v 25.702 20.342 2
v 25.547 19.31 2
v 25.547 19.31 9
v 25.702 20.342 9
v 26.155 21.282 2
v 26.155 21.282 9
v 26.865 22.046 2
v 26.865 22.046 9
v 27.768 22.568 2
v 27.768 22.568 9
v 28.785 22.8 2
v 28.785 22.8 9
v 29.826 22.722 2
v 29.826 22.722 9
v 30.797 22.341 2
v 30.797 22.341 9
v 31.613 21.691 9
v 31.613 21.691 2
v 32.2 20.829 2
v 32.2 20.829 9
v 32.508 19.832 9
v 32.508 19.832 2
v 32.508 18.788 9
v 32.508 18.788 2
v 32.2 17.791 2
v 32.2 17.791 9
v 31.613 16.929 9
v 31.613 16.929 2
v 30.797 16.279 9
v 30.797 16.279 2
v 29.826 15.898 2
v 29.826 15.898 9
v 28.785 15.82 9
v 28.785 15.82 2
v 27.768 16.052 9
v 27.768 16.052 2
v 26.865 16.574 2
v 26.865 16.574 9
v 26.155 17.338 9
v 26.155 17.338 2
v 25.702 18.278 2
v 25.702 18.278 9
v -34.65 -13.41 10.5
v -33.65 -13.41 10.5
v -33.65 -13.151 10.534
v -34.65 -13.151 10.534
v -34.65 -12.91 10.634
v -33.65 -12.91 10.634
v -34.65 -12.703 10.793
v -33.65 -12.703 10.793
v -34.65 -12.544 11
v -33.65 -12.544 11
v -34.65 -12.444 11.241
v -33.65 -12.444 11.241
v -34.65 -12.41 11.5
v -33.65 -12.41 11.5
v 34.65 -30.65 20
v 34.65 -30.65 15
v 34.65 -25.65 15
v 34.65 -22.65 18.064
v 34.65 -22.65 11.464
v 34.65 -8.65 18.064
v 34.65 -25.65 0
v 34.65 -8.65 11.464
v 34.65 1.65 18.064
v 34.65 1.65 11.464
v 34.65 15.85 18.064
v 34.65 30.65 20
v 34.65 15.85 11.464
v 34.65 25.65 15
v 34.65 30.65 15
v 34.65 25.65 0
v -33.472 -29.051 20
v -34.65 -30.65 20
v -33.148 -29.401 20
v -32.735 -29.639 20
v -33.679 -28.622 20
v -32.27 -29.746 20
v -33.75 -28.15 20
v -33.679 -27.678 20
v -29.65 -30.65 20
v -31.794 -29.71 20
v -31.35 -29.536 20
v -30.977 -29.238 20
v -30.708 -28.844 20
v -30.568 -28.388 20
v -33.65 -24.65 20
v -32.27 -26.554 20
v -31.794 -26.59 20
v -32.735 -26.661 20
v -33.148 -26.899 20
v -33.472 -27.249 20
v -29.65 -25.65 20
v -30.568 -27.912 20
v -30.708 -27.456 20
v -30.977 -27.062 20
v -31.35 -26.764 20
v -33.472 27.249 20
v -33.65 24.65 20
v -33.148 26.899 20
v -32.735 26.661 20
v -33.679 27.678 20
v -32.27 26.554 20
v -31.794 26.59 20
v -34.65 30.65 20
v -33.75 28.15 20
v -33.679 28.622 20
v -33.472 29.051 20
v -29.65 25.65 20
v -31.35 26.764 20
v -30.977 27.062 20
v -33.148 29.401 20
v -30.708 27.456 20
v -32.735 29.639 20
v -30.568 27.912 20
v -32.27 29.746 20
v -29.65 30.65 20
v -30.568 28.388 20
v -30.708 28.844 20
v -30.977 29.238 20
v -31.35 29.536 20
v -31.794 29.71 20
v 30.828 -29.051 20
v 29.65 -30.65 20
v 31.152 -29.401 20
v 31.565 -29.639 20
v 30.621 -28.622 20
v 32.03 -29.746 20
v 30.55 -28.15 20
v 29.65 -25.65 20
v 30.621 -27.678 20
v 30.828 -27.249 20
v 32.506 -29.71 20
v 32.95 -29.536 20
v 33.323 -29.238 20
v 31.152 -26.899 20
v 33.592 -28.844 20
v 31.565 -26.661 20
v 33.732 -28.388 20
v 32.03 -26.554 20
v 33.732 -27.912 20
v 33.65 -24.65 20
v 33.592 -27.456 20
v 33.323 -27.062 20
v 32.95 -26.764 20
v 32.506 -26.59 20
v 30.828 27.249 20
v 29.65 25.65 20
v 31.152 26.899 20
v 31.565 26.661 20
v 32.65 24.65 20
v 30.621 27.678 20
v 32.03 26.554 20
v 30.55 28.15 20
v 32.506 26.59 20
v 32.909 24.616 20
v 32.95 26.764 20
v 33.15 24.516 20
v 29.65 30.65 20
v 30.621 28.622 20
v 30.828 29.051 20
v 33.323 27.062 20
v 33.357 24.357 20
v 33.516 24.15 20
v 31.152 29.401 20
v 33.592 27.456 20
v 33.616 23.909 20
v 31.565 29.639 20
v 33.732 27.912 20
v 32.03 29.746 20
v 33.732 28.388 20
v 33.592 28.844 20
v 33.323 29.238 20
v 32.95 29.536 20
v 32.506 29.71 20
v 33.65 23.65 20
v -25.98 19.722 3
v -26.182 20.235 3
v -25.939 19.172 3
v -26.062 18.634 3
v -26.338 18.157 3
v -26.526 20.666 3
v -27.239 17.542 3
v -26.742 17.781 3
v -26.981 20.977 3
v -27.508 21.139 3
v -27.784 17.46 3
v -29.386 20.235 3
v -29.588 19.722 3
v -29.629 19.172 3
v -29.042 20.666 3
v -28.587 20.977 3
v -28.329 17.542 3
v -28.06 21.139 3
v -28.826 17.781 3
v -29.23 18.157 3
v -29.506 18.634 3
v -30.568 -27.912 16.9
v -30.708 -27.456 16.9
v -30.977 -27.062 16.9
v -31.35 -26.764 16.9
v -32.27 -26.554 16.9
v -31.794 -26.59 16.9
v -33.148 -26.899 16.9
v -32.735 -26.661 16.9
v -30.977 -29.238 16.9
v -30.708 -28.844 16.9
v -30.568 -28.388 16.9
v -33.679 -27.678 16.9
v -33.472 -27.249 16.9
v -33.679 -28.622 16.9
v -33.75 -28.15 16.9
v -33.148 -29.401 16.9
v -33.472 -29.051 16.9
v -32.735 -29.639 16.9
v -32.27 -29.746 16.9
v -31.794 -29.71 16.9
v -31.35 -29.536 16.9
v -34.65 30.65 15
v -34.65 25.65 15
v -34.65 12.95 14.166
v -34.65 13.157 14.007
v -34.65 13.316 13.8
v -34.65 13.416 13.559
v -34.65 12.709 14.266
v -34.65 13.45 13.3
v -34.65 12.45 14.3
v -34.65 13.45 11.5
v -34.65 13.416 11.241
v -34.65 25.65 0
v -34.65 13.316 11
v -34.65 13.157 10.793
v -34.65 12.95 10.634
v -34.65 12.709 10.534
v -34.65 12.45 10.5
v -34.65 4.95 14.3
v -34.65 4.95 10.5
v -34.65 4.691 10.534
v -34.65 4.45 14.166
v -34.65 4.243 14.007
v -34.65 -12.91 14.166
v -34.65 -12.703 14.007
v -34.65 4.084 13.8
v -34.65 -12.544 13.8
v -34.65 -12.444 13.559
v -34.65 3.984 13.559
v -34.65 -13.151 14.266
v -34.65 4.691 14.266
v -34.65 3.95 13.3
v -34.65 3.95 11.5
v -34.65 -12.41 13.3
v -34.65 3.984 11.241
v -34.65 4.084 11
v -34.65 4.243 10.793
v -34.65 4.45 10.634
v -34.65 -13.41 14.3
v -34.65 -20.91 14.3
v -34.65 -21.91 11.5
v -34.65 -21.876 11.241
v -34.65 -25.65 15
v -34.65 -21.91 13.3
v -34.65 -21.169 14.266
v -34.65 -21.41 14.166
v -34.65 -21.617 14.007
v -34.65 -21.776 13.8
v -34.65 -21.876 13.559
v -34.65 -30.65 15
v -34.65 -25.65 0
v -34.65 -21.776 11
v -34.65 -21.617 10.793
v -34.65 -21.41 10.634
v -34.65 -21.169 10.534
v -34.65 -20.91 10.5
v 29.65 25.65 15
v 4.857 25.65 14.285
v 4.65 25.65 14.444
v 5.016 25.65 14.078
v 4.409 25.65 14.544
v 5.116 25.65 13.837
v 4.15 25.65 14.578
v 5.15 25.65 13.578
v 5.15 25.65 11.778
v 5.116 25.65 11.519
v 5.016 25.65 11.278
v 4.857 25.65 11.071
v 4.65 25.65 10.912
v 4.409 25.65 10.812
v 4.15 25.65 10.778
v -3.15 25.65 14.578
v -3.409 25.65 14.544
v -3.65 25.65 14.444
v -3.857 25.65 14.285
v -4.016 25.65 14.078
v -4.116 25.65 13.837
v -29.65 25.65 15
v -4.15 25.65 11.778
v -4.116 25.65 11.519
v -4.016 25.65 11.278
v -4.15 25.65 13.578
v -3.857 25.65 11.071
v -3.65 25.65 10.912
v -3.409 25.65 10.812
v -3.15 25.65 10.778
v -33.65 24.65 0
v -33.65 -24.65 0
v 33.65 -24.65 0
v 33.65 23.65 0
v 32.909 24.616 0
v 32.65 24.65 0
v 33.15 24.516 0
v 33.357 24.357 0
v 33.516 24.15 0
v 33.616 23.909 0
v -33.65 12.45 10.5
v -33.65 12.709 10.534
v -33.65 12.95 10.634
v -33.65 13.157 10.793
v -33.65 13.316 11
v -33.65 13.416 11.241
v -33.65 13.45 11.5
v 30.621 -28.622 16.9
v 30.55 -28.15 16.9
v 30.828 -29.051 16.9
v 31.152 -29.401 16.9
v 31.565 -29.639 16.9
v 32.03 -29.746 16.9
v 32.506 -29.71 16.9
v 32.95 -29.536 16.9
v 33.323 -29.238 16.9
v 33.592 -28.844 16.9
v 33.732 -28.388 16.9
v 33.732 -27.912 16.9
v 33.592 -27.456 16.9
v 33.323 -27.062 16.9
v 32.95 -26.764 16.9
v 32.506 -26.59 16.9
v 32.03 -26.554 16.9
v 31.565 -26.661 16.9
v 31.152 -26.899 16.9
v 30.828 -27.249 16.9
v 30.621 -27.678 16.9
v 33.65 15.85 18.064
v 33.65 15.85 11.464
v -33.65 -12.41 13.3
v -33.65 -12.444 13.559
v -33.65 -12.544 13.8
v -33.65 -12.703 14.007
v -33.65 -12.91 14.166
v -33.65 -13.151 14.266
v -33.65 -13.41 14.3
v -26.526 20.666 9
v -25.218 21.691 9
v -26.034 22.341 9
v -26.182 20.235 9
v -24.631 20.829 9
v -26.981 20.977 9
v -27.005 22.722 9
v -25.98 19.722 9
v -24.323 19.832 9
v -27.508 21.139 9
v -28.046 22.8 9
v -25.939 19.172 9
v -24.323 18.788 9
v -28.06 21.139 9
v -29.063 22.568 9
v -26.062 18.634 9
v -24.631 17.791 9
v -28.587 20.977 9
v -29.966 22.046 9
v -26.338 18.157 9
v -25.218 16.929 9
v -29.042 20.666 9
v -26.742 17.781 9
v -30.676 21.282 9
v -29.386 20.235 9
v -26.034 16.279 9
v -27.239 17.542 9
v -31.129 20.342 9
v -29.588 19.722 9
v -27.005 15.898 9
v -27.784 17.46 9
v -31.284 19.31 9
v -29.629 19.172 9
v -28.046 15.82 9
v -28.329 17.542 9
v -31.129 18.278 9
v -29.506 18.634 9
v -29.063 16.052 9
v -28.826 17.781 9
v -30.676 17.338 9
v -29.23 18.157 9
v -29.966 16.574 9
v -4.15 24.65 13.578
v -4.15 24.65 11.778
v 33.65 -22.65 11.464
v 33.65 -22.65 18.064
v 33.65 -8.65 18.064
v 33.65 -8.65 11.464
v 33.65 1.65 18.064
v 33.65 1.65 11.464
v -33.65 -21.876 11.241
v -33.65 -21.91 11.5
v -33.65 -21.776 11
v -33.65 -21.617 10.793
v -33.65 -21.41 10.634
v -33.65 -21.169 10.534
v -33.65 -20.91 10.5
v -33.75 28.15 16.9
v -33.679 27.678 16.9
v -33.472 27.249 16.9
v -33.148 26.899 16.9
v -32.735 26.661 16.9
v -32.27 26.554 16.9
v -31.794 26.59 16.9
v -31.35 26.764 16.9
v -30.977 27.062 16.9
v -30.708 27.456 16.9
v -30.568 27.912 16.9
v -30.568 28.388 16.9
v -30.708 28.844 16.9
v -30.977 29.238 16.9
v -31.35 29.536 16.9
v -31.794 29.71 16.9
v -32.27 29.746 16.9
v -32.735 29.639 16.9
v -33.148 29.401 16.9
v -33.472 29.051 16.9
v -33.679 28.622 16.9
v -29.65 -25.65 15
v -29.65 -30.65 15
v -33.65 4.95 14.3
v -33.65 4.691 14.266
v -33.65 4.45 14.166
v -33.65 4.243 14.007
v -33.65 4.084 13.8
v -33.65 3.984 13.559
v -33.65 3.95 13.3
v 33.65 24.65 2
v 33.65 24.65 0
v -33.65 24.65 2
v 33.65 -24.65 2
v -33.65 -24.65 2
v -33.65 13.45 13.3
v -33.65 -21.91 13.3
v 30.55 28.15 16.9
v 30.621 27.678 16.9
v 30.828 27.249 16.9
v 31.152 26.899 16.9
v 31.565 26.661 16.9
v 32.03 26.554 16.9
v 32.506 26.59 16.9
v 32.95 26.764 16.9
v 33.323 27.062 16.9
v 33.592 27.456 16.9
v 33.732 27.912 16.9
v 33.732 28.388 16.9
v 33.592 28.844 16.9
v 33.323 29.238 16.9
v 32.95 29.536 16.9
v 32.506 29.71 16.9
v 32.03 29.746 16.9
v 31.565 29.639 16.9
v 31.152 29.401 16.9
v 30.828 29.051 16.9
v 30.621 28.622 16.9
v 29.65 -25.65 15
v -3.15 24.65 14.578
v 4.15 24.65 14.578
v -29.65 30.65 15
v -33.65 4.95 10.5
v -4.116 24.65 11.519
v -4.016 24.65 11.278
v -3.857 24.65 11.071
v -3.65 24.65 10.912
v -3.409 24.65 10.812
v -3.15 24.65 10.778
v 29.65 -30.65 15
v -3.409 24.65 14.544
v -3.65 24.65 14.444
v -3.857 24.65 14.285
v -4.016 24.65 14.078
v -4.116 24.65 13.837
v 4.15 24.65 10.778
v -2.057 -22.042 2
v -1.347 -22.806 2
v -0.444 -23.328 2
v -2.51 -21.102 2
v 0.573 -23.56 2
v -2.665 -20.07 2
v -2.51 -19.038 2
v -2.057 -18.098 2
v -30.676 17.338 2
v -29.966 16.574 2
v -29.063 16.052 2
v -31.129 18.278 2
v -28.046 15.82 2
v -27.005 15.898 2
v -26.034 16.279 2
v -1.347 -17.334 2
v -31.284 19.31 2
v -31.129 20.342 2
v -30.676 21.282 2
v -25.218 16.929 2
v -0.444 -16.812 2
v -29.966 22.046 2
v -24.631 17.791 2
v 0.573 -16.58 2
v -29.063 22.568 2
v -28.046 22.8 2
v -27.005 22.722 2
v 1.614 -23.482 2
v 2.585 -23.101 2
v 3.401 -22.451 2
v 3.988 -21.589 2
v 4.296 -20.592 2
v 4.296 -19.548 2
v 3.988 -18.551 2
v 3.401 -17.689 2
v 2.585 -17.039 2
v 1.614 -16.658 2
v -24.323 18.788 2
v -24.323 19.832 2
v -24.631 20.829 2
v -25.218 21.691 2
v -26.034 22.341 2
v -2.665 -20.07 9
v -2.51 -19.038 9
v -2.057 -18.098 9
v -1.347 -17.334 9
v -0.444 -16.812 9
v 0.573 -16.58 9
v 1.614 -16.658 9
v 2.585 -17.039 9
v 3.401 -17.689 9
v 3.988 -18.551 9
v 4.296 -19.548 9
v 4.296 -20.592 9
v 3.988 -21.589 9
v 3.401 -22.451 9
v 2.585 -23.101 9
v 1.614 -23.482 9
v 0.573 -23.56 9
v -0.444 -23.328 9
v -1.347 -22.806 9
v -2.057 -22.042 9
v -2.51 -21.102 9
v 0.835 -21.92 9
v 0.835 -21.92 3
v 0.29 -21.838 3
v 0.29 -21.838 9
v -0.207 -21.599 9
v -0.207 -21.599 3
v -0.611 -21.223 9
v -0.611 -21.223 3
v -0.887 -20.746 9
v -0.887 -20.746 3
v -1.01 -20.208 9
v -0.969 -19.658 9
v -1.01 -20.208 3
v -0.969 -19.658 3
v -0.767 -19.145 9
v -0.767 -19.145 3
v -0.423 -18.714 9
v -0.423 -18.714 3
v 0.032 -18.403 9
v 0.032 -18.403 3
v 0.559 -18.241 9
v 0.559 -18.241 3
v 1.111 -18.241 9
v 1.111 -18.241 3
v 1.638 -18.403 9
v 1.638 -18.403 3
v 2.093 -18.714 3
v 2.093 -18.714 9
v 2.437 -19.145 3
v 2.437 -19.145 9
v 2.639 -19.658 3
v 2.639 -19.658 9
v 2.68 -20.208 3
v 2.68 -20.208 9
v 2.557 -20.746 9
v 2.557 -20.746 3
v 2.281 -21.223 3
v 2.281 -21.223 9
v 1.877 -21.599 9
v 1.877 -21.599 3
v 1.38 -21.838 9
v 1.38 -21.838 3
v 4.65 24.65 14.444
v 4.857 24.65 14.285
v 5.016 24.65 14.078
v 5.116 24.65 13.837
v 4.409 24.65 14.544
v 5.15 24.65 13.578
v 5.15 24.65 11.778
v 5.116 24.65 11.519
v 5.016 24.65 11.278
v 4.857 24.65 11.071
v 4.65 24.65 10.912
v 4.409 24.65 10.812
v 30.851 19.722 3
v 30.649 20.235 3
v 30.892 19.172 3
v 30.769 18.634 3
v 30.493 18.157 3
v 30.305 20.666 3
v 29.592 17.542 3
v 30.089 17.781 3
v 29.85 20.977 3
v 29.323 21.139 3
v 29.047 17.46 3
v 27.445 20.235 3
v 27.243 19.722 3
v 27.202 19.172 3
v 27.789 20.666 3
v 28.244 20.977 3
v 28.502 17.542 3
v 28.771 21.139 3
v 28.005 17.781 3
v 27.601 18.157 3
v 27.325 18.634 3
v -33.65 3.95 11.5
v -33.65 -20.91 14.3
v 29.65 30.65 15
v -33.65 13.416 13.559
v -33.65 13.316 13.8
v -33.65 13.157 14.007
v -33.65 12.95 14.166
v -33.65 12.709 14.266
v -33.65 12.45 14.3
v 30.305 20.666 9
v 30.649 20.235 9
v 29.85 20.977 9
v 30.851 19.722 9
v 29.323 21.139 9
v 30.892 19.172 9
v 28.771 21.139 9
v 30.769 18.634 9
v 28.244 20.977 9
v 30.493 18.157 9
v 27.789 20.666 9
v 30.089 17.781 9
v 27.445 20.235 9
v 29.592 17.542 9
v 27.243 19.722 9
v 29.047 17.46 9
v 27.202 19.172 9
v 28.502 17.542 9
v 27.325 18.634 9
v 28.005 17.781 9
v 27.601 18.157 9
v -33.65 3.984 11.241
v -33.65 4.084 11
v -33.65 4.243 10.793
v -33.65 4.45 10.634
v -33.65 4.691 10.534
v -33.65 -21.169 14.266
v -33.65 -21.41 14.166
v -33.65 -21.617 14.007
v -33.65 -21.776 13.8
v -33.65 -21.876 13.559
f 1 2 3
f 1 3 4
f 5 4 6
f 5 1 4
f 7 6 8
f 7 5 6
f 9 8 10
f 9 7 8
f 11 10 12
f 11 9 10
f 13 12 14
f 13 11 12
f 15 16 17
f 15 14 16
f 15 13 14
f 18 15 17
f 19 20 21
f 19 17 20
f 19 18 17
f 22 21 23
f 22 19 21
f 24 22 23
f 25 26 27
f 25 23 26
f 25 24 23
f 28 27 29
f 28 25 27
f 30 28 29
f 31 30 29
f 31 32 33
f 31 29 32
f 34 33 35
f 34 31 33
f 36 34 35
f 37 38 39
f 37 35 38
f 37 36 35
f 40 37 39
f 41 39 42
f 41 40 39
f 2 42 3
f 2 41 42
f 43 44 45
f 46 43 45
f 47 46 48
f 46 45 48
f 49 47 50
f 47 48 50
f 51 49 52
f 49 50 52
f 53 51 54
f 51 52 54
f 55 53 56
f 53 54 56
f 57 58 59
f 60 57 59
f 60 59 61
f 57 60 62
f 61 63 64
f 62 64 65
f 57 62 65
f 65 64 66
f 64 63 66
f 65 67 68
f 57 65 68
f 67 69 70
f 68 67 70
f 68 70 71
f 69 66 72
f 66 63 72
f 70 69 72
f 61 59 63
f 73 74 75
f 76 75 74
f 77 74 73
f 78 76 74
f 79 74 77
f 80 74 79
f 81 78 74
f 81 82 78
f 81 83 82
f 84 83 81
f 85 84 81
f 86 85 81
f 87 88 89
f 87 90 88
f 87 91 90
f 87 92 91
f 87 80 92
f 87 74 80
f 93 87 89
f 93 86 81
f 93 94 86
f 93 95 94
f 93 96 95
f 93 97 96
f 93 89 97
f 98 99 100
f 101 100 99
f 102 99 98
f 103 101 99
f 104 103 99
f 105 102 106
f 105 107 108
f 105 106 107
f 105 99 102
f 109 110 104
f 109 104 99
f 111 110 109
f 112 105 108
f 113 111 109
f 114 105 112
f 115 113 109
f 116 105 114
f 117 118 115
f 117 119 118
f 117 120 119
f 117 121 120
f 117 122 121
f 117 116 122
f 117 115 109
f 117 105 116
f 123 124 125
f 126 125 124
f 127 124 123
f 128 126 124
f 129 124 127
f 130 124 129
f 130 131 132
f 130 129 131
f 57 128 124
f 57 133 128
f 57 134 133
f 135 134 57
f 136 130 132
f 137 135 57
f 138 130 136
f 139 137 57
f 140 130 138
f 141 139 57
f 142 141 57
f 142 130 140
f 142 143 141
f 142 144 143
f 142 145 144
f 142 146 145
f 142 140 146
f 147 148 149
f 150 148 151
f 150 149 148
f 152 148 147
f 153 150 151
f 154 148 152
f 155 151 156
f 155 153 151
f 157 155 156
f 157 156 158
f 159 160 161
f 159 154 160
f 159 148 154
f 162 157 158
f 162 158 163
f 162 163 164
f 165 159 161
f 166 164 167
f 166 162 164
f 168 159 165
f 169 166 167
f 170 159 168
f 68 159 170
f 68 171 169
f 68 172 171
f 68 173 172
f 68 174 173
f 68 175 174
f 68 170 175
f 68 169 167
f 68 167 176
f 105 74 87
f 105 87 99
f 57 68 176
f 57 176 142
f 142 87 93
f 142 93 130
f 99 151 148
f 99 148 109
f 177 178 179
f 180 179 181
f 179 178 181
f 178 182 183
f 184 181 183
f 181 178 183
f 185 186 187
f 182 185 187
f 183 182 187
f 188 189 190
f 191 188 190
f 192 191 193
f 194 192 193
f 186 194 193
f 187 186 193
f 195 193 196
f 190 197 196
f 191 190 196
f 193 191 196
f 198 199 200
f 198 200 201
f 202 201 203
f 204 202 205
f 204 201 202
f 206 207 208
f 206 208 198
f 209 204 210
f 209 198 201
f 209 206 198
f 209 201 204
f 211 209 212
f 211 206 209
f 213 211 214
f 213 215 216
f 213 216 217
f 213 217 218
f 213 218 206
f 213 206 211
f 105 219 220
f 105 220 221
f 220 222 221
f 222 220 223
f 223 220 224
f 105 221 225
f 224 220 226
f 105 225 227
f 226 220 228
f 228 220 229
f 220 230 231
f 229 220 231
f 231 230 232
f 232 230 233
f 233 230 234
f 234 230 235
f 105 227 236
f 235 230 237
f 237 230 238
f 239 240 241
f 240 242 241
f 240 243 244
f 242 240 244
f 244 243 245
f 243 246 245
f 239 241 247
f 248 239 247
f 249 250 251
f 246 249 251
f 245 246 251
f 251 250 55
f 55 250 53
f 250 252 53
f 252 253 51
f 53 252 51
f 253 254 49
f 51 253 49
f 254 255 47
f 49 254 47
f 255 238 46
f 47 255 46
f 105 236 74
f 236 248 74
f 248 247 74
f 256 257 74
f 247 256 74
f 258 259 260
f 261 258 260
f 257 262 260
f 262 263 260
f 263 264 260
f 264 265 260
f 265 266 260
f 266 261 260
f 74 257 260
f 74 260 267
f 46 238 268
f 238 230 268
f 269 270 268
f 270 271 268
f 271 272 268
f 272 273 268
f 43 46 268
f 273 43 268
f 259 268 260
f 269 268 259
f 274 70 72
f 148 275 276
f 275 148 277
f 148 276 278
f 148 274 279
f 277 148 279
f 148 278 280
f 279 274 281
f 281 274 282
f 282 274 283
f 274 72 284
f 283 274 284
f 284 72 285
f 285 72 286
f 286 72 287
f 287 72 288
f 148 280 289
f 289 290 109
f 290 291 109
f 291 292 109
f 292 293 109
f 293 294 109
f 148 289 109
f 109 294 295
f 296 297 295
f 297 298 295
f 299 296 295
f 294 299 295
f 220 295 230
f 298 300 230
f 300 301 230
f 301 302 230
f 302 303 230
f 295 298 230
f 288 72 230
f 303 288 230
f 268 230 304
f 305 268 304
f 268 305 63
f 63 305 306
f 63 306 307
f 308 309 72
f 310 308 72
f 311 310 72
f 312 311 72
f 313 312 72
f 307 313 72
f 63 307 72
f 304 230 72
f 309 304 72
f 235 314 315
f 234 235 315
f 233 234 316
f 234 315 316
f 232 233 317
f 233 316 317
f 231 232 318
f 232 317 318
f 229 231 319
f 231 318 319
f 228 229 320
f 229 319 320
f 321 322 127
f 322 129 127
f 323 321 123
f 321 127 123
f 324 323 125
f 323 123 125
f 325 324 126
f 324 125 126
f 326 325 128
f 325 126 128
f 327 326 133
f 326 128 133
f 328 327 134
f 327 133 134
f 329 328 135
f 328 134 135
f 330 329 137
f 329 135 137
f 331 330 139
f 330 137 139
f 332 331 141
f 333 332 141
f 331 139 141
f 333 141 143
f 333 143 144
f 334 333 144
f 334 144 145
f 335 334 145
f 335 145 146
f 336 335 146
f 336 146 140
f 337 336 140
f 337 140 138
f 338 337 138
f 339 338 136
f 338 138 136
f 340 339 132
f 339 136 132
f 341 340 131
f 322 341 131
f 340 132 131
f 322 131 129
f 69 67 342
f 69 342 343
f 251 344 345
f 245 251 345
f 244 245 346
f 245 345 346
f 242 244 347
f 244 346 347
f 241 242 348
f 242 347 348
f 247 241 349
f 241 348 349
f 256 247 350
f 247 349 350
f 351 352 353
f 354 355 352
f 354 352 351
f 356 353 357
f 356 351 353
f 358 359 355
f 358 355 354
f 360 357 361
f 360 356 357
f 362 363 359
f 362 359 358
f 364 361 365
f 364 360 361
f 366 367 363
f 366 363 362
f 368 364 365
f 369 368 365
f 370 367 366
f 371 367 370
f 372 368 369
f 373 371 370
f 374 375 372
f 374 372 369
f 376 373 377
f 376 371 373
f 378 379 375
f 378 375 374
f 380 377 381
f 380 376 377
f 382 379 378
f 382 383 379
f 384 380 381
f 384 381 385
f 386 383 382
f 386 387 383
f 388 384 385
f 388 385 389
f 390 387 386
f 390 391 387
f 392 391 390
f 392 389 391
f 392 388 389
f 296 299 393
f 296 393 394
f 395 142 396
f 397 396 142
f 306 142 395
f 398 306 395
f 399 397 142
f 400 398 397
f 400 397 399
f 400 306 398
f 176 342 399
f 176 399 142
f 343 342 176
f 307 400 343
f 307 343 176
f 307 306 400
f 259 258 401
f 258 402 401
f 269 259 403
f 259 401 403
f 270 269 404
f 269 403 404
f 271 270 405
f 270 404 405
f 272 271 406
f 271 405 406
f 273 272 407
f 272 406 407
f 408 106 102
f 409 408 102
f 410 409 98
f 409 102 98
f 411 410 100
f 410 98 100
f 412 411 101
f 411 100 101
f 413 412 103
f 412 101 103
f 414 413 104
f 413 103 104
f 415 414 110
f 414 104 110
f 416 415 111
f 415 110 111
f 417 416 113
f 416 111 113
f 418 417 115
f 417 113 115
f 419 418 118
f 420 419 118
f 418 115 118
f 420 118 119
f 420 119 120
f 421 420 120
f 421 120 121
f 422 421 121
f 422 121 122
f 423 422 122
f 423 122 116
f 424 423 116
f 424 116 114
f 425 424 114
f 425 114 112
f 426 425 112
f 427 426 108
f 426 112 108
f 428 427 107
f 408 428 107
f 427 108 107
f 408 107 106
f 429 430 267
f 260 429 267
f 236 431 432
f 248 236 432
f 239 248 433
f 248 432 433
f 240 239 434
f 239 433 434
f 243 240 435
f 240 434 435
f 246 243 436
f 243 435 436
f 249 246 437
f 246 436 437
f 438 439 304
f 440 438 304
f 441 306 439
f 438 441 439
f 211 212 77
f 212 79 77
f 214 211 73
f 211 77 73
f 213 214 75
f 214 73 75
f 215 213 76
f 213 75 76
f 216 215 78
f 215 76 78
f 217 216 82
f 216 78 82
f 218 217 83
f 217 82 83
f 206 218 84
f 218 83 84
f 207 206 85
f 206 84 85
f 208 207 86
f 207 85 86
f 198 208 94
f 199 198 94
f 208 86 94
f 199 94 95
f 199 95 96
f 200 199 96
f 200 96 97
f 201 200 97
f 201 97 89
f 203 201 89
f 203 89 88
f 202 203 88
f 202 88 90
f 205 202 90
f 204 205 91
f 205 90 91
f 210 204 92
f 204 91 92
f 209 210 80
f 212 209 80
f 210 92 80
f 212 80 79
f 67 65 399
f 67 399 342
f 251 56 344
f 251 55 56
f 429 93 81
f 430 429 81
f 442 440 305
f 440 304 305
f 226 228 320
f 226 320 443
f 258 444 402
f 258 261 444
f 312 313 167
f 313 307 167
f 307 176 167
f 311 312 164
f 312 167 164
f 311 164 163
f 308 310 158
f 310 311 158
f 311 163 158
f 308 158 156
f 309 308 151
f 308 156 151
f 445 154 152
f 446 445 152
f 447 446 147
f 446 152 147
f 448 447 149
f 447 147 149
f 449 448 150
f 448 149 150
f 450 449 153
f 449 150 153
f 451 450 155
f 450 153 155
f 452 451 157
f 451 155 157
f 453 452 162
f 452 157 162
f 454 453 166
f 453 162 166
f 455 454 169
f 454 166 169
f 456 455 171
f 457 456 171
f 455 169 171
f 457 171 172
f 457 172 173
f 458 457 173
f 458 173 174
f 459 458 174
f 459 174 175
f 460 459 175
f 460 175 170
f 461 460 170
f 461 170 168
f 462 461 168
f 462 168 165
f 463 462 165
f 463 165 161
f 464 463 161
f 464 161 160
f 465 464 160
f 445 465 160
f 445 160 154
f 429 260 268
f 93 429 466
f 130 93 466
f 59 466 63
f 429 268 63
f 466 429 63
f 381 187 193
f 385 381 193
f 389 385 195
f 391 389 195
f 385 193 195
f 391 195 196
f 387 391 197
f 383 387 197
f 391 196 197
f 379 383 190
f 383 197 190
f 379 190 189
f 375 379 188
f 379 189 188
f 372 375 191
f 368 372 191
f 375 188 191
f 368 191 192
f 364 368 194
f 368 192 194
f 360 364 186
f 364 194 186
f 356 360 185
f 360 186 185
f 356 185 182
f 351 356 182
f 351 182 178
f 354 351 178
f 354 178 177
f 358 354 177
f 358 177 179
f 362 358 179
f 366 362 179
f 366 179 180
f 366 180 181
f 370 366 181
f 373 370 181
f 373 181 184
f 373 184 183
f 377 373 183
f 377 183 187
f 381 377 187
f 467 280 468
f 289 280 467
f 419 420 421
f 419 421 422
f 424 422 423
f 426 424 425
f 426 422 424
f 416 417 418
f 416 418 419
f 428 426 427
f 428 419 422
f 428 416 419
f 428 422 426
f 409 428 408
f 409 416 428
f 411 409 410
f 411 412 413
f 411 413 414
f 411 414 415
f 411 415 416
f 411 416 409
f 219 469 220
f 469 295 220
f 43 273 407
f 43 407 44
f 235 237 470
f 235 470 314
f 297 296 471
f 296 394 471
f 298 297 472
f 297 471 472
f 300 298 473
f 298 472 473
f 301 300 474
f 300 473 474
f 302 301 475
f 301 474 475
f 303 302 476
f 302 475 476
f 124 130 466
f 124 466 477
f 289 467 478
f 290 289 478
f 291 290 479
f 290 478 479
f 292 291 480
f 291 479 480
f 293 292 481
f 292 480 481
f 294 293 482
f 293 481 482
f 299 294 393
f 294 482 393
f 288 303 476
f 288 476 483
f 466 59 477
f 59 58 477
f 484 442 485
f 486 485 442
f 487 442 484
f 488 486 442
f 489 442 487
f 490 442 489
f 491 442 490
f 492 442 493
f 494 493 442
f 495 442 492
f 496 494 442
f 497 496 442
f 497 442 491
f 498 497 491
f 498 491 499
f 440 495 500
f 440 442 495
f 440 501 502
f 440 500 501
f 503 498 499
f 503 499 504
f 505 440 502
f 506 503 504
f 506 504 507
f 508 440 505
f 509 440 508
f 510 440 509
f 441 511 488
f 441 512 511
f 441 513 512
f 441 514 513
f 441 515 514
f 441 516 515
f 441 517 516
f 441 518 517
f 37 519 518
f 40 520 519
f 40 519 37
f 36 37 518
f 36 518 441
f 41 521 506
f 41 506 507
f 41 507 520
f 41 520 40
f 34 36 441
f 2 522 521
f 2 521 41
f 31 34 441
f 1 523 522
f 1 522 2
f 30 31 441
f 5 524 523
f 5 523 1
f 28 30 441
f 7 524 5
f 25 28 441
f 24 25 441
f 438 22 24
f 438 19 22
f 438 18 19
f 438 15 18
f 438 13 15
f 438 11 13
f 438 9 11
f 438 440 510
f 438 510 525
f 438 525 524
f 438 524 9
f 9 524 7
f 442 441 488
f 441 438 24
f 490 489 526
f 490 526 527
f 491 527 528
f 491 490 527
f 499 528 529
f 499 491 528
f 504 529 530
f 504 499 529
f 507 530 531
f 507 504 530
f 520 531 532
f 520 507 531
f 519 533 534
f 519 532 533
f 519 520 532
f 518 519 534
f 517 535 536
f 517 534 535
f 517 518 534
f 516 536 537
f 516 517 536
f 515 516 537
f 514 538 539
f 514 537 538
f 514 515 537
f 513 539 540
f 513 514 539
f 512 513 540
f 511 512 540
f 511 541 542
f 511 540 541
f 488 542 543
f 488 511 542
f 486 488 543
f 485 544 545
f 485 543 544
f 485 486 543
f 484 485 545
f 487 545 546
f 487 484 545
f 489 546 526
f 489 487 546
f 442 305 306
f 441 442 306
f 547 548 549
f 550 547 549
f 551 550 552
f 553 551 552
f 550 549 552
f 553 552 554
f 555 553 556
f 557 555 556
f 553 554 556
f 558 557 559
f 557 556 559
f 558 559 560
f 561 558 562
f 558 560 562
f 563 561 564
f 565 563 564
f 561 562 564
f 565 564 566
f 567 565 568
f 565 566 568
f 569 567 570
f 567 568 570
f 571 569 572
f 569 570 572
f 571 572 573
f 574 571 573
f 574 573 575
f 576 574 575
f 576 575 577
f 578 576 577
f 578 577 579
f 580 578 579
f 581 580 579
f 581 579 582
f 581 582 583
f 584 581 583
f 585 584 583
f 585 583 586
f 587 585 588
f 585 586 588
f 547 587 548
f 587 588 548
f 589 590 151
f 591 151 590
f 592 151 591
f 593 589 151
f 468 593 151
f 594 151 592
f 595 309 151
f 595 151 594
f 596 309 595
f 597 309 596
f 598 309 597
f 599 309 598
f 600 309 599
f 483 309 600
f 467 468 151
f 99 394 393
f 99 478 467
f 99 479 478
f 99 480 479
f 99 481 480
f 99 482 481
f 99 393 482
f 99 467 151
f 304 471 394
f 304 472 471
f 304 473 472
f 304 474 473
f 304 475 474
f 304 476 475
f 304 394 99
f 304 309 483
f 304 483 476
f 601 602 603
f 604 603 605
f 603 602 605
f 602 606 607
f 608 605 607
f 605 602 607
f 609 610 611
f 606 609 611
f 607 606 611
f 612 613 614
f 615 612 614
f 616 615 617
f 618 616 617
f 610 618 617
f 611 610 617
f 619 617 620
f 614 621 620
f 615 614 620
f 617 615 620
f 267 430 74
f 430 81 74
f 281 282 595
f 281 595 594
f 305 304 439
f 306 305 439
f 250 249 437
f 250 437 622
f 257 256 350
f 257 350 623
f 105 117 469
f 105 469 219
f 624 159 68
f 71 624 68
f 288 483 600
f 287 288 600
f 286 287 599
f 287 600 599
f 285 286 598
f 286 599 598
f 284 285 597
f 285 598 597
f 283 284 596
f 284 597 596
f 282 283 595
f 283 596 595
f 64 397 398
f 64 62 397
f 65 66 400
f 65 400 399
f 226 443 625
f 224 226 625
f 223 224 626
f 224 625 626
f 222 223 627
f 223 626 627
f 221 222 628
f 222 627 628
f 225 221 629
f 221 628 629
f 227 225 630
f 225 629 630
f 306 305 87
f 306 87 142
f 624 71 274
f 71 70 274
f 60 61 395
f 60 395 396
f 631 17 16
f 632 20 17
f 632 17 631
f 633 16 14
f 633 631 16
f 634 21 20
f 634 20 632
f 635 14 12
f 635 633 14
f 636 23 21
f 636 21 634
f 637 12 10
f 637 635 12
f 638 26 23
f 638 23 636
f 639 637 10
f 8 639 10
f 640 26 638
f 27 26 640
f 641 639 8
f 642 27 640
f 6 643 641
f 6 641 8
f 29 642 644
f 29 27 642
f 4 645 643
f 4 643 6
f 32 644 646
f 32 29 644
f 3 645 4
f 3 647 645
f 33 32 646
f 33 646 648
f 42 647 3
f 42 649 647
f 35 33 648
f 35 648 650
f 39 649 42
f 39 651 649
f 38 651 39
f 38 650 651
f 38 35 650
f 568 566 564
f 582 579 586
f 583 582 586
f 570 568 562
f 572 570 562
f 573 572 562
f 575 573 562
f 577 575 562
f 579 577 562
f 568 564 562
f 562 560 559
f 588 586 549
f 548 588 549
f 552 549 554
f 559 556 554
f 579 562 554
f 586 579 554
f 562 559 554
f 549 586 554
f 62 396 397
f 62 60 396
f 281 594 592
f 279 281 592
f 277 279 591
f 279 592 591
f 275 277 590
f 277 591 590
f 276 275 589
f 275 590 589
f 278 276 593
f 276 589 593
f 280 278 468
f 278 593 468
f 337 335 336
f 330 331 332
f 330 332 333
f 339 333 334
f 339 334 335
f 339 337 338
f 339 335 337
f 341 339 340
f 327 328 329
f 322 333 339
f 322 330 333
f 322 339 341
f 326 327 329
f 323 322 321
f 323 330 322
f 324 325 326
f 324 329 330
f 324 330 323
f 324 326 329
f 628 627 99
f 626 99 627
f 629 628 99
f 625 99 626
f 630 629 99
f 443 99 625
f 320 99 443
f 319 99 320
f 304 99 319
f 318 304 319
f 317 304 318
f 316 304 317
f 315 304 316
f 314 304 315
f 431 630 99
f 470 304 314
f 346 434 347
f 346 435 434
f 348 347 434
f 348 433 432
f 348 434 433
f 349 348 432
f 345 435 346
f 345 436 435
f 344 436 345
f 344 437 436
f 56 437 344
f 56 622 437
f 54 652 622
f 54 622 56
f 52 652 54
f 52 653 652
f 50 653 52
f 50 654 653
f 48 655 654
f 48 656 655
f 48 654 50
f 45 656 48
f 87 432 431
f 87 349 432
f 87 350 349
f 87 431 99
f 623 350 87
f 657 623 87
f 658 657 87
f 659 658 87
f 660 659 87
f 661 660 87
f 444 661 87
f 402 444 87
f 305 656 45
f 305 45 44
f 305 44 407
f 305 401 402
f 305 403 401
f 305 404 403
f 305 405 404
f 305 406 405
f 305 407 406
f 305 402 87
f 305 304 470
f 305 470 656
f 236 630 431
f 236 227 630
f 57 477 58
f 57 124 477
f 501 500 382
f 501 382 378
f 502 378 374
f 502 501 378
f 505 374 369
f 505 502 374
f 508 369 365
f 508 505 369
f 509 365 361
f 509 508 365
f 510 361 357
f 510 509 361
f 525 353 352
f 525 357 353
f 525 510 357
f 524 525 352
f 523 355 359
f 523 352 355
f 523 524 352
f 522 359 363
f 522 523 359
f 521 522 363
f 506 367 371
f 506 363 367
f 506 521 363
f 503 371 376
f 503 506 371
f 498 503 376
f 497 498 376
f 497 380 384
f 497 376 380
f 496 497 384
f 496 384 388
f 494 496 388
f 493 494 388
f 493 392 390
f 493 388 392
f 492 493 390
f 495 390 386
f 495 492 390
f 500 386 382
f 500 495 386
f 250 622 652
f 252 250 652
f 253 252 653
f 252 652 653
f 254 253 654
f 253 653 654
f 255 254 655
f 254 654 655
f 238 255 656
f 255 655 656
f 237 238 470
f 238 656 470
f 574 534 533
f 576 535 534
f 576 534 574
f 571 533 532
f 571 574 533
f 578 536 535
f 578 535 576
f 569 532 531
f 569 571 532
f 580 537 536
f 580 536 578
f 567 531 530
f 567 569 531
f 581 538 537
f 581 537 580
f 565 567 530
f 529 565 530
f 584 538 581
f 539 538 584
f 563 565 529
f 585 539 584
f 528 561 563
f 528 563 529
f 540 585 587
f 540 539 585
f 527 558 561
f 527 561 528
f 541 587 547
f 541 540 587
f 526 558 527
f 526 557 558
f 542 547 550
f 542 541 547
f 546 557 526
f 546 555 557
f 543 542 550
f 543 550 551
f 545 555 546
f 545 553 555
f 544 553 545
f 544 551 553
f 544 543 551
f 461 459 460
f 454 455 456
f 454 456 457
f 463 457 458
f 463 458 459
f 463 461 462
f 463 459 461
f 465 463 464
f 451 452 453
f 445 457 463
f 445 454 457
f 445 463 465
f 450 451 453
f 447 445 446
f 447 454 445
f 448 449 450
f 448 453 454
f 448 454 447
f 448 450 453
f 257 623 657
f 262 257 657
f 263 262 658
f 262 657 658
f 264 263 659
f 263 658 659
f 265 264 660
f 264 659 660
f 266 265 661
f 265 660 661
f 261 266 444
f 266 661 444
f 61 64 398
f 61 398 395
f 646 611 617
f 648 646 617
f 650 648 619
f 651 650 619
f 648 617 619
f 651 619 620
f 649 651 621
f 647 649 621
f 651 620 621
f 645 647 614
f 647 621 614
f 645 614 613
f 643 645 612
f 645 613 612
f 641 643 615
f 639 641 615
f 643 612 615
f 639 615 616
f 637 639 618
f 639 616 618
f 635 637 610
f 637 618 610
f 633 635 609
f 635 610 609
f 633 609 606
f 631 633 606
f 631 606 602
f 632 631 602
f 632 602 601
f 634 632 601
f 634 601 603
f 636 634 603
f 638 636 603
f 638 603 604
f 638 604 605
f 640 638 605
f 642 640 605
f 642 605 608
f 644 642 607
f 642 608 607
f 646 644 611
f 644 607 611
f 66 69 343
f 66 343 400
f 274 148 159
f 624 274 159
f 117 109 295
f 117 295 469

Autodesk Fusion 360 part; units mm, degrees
sketch "Sketch1" plane through (0, 0, 0) normal (0, 0, 1) x (1, 0, 0)
  line L0 (33.65, 24.65) -> (-33.65, 24.65)
  line L1 (-33.65, 24.65) -> (-33.65, -24.65)
  line L2 (-33.65, -24.65) -> (33.65, -24.65)
  line L3 (33.65, -24.65) -> (33.65, 24.65)
  line L4 (33.65, 24.65) -> (-33.65, -24.65) construction
  line L5 (-33.65, 24.65) -> (33.65, -24.65) construction
  line L6 (34.65, 25.65) -> (-34.65, 25.65)
  line L7 (-34.65, 25.65) -> (-34.65, -25.65)
  line L8 (-34.65, -25.65) -> (34.65, -25.65)
  line L9 (34.65, -25.65) -> (34.65, 25.65)
  line L10 (34.65, 25.65) -> (-34.65, -25.65) construction
  line L11 (-34.65, 25.65) -> (34.65, -25.65) construction
  line L12 (33.65, 24.65) -> (38.3726, 24.65)
  line L13 (38.3726, 24.65) -> (38.3726, 29.0356)
  line L14 (38.3726, 29.0356) -> (34.2811, 29.0356)
  line L15 (34.2811, 29.0356) -> (33.65, 24.65)
  line L16 (38.3726, 24.65) -> (34.2811, 29.0356) construction
  dimension "d1" = 67.3
  dimension "d2" = 49.3
  dimension "d3" = 69.3
  dimension "d4" = 51.3
extrude "Extrude1" add sketch "Sketch1" along normal blind 2 contours L0 L1 L2 L3 makes body 1
extrude "Extrude2" add sketch "Sketch1" along normal blind 20 separate body contours L6 L9 L12 L15 | L6 L7 L8 L9 L12 L15 makes body 2
sketch "Sketch2" plane through (0, 0, 2) normal (0, 0, 1) x (-1, 0, 0)
  line L0 (-33.65, 24.65) -> (-33.65, -24.65)
  line L1 (-33.65, -24.65) -> (33.65, -24.65)
  line L2 (33.65, -24.65) -> (33.65, 24.65)
  line L3 (33.65, 24.65) -> (-33.65, 24.65)
  circle A0 centre (27.784, -19.31) radius 3.5
  circle A1 centre (-29.047, -19.31) radius 3.5
  line L4 (33.65, -24.65) -> (33.65, 24.65) construction
  line L5 (-33.65, -24.65) -> (33.65, -24.65) construction
  circle A2 centre (-0.835, 20.07) radius 3.5
  dimension "d9" = 7
  dimension "d10" = 7
  dimension "d11" = 5.866
  dimension "d12" = 5.34
  dimension "d14" = 5.34
  dimension "d15" = 7
  dimension "d16" = 34.485
  dimension "d20" = 4.603
  dimension "d21" = 4.58
extrude "Extrude4" add sketch "Sketch2" along normal blind 7 contours A0 | A1 | A2 bodies 1
extrude "Extrude3" add sketch "Sketch2" along normal blind 3 contours A0 | A1 | A2 bodies 1
hole "Hole1" at (-27.784, 19.31, 9) direction (0, 0, -1) diameter 3.7 depth 6 tip angle 180 bodies 1
hole "Hole2" at (29.047, 19.31, 9) direction (0, 0, -1) diameter 3.7 depth 6 tip angle 180 bodies 1
hole "Hole3" at (0.835, -20.07, 9) direction (0, 0, -1) diameter 3.7 depth 6 tip angle 180 bodies 1
sketch "Sketch3" plane through (34.65, 0, 0) normal (1, 0, 0) x (0, 1, 0)
  line L0 (25.65, 0) -> (25.65, 20)
  line L1 (25.65, 20) -> (-25.65, 20)
  line L2 (-25.65, 20) -> (-25.65, 0)
  line L3 (-22.65, 18.064) -> (-8.65, 18.064)
  line L4 (-8.65, 18.064) -> (-8.65, 11.464)
  line L5 (-8.65, 11.464) -> (-22.65, 11.464)
  line L6 (-22.65, 11.464) -> (-22.65, 18.064)
  line L7 (1.65, 18.064) -> (15.85, 18.064)
  line L8 (15.85, 18.064) -> (15.85, 11.464)
  line L9 (15.85, 11.464) -> (1.65, 11.464)
  line L10 (1.65, 11.464) -> (1.65, 18.064)
  dimension "d33" = 14
  dimension "d34" = 6.6
  dimension "d35" = 14.2
  dimension "d36" = 6.6
  dimension "d37" = 3
  dimension "d38" = 9.8
  dimension "d39" = 1.936
  dimension "d40" = 1.936
extrude "Extrude5" cut sketch "Sketch3" against normal blind 2 bodies 2
sketch "Sketch4" plane through (0, 25.65, 0) normal (0, 1, 0) x (-1, 0, 0)
  line L0 (-34.65, 0) -> (34.65, 0)
  line L1 (34.65, 0) -> (34.65, 20)
  line L2 (34.65, 20) -> (-34.65, 20)
  line L3 (-34.65, 20) -> (-34.65, 0)
  line L4 (-5.15, 14.578) -> (4.15, 14.578)
  line L5 (4.15, 14.578) -> (4.15, 10.778)
  line L6 (4.15, 10.778) -> (-5.15, 10.778)
  line L7 (-5.15, 10.778) -> (-5.15, 14.578)
  dimension "d43" = 9.3
  dimension "d44" = 3.8
  dimension "d45" = 29.5
  dimension "d46" = 5.422
extrude "Extrude6" cut sketch "Sketch4" against normal blind 2 contours L4 L5 L6 L7 bodies 2
fillet "Fillet1" radius 1 4 edges at (-4.15, 25.15, 10.778) (-4.15, 25.15, 14.578) (5.15, 25.15, 14.578) (5.15, 25.15, 10.778) on bodies 2
sketch "Sketch5" plane through (-34.65, 0, 0) normal (-1, 0, 0) x (0, -1, 0)
  line L0 (-25.65, 0) -> (25.65, 0)
  line L1 (25.65, 0) -> (25.65, 20)
  line L2 (25.65, 20) -> (-25.65, 20)
  line L3 (-25.65, 20) -> (-25.65, 0)
  line L4 (-13.45, 14.3) -> (-3.95, 14.3)
  line L5 (-3.95, 14.3) -> (-3.95, 10.5)
  line L6 (-3.95, 10.5) -> (-13.45, 10.5)
  line L7 (-13.45, 10.5) -> (-13.45, 14.3)
  line L8 (12.41, 14.3) -> (21.91, 14.3)
  line L9 (21.91, 14.3) -> (21.91, 10.5)
  line L10 (21.91, 10.5) -> (12.41, 10.5)
  line L11 (12.41, 10.5) -> (12.41, 14.3)
  dimension "d51" = 9.5
  dimension "d52" = 3.8
  dimension "d53" = 9.5
  dimension "d54" = 3.8
  dimension "d55" = 12.2
  dimension "d56" = 3.74
  dimension "d57" = 5.7
  dimension "d58" = 5.7
extrude "Extrude7" cut sketch "Sketch5" against normal blind 2 contours L4 L5 L6 L7 bodies 2
extrude "Extrude8" cut sketch "Sketch5" against normal blind 2 contours L8 L9 L10 L11 bodies 2
fillet "Fillet2" radius 1 8 edges at (-34.15, 13.45, 14.3) (-34.15, 3.95, 14.3) (-34.15, 3.95, 10.5) (-34.15, 13.45, 10.5) (-34.15, -12.41, 10.5) (-34.15, -12.41, 14.3) (-34.15, -21.91, 14.3) (-34.15, -21.91, 10.5) on bodies 2
sketch "Sketch6" plane through (0, 25.65, 0) normal (0, 1, 0) x (-1, 0, 0)
  line L0 (4.15, 13.578) -> (4.15, 11.778)
  arc A0 (3.15, 10.778) -> (4.15, 11.778) centre (3.15, 11.778) ccw
  line L1 (3.15, 10.778) -> (-4.15, 10.778)
  arc A1 (-5.15, 11.778) -> (-4.15, 10.778) centre (-4.15, 11.778) ccw
  line L2 (-5.15, 11.778) -> (-5.15, 13.578)
  arc A2 (-4.15, 14.578) -> (-5.15, 13.578) centre (-4.15, 13.578) ccw
  line L3 (-4.15, 14.578) -> (3.15, 14.578)
  arc A3 (4.15, 13.578) -> (3.15, 14.578) centre (3.15, 13.578) ccw
  line L4 (-34.65, 0) -> (34.65, 0)
  line L5 (34.65, 0) -> (34.65, 20)
  line L6 (34.65, 20) -> (-34.65, 20)
  line L7 (-34.65, 20) -> (-34.65, 0)
fillet "Fillet3" radius 1 1 edges at (33.65, 24.65, 10) on bodies 2
sketch "Sketch11" plane through (0, 0, 20) normal (0, 0, 1) x (-1, 0, 0)
  line L0 (-33.65, -23.65) -> (-33.65, 24.65)
  line L1 (-33.65, 24.65) -> (33.65, 24.65)
  line L2 (33.65, 24.65) -> (33.65, -24.65)
  line L3 (33.65, -24.65) -> (-32.65, -24.65)
  arc A0 (-33.65, -23.65) -> (-32.65, -24.65) centre (-32.65, -23.65) ccw
  line L4 (-34.65, 25.65) -> (-34.65, -25.65)
  line L5 (-34.65, -25.65) -> (34.65, -25.65)
  line L6 (34.65, -25.65) -> (34.65, 25.65)
  line L7 (34.65, 25.65) -> (-34.65, 25.65)
  line L8 (34.65, -25.65) -> (29.65, -25.65)
  line L9 (29.65, -25.65) -> (29.65, -30.65)
  line L10 (29.65, -30.65) -> (34.65, -30.65)
  line L11 (34.65, -30.65) -> (34.65, -25.65)
  line L12 (-34.65, -25.65) -> (-29.65, -25.65)
  line L13 (-29.65, -25.65) -> (-29.65, -30.65)
  line L14 (-29.65, -30.65) -> (-34.65, -30.65)
  line L15 (-34.65, -30.65) -> (-34.65, -25.65)
  line L16 (-34.65, 25.65) -> (-29.65, 25.65)
  line L17 (-29.65, 25.65) -> (-29.65, 30.65)
  line L18 (-29.65, 30.65) -> (-34.65, 30.65)
  line L19 (-34.65, 30.65) -> (-34.65, 25.65)
  line L20 (34.65, 25.65) -> (29.65, 25.65)
  line L21 (29.65, 25.65) -> (29.65, 30.65)
  line L22 (29.65, 30.65) -> (34.65, 30.65)
  line L23 (34.65, 30.65) -> (34.65, 25.65)
  dimension "d110" = 5
  dimension "d111" = 5
  dimension "d112" = 5
  dimension "d113" = 5
  dimension "d114" = 5
  dimension "d115" = 5
  dimension "d116" = 5
  dimension "d117" = 5
extrude "Extrude12" add sketch "Sketch11" against normal blind 5 contours L7 L16 L17 L18 L19 | L5 L12 L13 L14 L15 | L7 L20 L21 L22 L23 | L5 L8 L9 L10 L11 bodies 2
sketch "Sketch12" plane through (0, 0, 20) normal (0, 0, 1) x (-1, 0, 0)
  line L0 (-33.65, -23.65) -> (-33.65, 24.65)
  line L1 (-33.65, 24.65) -> (33.65, 24.65)
  line L2 (33.65, 24.65) -> (33.65, -24.65)
  line L3 (33.65, -24.65) -> (-32.65, -24.65)
  arc A0 (-33.65, -23.65) -> (-32.65, -24.65) centre (-32.65, -23.65) ccw
  line L4 (-34.65, 30.65) -> (-34.65, -30.65)
  line L5 (-34.65, -30.65) -> (-29.65, -30.65)
  line L6 (-29.65, -30.65) -> (-29.65, -25.65)
  line L7 (-29.65, -25.65) -> (29.65, -25.65)
  line L8 (29.65, -25.65) -> (29.65, -30.65)
  line L9 (29.65, -30.65) -> (34.65, -30.65)
  line L10 (34.65, -30.65) -> (34.65, 30.65)
  line L11 (34.65, 30.65) -> (29.65, 30.65)
  line L12 (29.65, 30.65) -> (29.65, 25.65)
  line L13 (29.65, 25.65) -> (-29.65, 25.65)
  line L14 (-29.65, 25.65) -> (-29.65, 30.65)
  line L15 (-29.65, 30.65) -> (-34.65, 30.65)
  circle A1 centre (32.15, 28.15) radius 1.6
  circle A2 centre (32.15, -28.15) radius 1.6
  circle A3 centre (-32.15, -28.15) radius 1.6
  circle A4 centre (-32.15, 28.15) radius 1.6
  dimension "d120" = 3.2
  dimension "d121" = 3.2
  dimension "d122" = 3.2
  dimension "d123" = 3.2
  dimension "d124" = 2.5
  dimension "d125" = 2.5
  dimension "d126" = 2.5
  dimension "d127" = 2.5
  dimension "d128" = 2.5
  dimension "d129" = 2.5
  dimension "d130" = 2.5
  dimension "d131" = 2.5
extrude "Extrude13" cut sketch "Sketch12" against normal blind 3.1 contours A1 | A2 | A3 | A4 bodies 2
